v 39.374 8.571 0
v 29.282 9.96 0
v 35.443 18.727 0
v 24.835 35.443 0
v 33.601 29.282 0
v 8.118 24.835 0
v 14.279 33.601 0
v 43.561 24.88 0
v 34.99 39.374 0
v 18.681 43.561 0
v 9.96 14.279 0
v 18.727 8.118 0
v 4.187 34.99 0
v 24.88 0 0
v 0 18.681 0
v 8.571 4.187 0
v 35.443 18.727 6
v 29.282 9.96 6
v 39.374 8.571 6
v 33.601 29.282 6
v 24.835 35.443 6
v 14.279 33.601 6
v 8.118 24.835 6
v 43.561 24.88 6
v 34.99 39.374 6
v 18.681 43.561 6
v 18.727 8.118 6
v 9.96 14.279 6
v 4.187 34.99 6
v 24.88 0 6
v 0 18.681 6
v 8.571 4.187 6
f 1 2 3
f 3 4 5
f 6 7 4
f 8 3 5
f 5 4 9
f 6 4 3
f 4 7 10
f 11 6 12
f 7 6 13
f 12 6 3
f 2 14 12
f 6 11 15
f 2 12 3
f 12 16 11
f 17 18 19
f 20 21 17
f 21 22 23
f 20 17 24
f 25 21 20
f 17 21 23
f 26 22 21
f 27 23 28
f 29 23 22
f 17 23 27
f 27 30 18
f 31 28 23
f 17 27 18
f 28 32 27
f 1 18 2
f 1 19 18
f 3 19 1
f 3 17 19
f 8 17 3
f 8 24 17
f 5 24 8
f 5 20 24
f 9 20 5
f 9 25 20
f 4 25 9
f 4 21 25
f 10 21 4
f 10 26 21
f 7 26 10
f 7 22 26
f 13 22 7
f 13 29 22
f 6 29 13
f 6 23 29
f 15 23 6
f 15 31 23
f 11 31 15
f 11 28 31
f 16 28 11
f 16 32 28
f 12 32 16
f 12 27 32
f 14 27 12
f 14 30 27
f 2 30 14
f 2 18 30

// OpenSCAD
$fn = 32;

// ----------------------------------------------------------------------
// Chain sprocket: 8 teeth, 14 mm root radius
// ----------------------------------------------------------------------

// --- parameters (mm) ---
profile_height = 6;       // extrusion height
profile_points = 16;      // points of the closed outline

profile = [[35.443, 18.727], [43.561, 24.88], [33.601, 29.282], [34.99, 39.374], [24.835, 35.443], [18.681, 43.561], [14.279, 33.601], [4.187, 34.99], [8.118, 24.835], [0, 18.681], [9.96, 14.279], [8.571, 4.187], [18.727, 8.118], [24.88, 0], [29.282, 9.96], [39.374, 8.571]];  // single closed polygon, 16 points, counter clockwise

// --- the one profile operation ---
linear_extrude(height = profile_height) polygon(points = profile);
